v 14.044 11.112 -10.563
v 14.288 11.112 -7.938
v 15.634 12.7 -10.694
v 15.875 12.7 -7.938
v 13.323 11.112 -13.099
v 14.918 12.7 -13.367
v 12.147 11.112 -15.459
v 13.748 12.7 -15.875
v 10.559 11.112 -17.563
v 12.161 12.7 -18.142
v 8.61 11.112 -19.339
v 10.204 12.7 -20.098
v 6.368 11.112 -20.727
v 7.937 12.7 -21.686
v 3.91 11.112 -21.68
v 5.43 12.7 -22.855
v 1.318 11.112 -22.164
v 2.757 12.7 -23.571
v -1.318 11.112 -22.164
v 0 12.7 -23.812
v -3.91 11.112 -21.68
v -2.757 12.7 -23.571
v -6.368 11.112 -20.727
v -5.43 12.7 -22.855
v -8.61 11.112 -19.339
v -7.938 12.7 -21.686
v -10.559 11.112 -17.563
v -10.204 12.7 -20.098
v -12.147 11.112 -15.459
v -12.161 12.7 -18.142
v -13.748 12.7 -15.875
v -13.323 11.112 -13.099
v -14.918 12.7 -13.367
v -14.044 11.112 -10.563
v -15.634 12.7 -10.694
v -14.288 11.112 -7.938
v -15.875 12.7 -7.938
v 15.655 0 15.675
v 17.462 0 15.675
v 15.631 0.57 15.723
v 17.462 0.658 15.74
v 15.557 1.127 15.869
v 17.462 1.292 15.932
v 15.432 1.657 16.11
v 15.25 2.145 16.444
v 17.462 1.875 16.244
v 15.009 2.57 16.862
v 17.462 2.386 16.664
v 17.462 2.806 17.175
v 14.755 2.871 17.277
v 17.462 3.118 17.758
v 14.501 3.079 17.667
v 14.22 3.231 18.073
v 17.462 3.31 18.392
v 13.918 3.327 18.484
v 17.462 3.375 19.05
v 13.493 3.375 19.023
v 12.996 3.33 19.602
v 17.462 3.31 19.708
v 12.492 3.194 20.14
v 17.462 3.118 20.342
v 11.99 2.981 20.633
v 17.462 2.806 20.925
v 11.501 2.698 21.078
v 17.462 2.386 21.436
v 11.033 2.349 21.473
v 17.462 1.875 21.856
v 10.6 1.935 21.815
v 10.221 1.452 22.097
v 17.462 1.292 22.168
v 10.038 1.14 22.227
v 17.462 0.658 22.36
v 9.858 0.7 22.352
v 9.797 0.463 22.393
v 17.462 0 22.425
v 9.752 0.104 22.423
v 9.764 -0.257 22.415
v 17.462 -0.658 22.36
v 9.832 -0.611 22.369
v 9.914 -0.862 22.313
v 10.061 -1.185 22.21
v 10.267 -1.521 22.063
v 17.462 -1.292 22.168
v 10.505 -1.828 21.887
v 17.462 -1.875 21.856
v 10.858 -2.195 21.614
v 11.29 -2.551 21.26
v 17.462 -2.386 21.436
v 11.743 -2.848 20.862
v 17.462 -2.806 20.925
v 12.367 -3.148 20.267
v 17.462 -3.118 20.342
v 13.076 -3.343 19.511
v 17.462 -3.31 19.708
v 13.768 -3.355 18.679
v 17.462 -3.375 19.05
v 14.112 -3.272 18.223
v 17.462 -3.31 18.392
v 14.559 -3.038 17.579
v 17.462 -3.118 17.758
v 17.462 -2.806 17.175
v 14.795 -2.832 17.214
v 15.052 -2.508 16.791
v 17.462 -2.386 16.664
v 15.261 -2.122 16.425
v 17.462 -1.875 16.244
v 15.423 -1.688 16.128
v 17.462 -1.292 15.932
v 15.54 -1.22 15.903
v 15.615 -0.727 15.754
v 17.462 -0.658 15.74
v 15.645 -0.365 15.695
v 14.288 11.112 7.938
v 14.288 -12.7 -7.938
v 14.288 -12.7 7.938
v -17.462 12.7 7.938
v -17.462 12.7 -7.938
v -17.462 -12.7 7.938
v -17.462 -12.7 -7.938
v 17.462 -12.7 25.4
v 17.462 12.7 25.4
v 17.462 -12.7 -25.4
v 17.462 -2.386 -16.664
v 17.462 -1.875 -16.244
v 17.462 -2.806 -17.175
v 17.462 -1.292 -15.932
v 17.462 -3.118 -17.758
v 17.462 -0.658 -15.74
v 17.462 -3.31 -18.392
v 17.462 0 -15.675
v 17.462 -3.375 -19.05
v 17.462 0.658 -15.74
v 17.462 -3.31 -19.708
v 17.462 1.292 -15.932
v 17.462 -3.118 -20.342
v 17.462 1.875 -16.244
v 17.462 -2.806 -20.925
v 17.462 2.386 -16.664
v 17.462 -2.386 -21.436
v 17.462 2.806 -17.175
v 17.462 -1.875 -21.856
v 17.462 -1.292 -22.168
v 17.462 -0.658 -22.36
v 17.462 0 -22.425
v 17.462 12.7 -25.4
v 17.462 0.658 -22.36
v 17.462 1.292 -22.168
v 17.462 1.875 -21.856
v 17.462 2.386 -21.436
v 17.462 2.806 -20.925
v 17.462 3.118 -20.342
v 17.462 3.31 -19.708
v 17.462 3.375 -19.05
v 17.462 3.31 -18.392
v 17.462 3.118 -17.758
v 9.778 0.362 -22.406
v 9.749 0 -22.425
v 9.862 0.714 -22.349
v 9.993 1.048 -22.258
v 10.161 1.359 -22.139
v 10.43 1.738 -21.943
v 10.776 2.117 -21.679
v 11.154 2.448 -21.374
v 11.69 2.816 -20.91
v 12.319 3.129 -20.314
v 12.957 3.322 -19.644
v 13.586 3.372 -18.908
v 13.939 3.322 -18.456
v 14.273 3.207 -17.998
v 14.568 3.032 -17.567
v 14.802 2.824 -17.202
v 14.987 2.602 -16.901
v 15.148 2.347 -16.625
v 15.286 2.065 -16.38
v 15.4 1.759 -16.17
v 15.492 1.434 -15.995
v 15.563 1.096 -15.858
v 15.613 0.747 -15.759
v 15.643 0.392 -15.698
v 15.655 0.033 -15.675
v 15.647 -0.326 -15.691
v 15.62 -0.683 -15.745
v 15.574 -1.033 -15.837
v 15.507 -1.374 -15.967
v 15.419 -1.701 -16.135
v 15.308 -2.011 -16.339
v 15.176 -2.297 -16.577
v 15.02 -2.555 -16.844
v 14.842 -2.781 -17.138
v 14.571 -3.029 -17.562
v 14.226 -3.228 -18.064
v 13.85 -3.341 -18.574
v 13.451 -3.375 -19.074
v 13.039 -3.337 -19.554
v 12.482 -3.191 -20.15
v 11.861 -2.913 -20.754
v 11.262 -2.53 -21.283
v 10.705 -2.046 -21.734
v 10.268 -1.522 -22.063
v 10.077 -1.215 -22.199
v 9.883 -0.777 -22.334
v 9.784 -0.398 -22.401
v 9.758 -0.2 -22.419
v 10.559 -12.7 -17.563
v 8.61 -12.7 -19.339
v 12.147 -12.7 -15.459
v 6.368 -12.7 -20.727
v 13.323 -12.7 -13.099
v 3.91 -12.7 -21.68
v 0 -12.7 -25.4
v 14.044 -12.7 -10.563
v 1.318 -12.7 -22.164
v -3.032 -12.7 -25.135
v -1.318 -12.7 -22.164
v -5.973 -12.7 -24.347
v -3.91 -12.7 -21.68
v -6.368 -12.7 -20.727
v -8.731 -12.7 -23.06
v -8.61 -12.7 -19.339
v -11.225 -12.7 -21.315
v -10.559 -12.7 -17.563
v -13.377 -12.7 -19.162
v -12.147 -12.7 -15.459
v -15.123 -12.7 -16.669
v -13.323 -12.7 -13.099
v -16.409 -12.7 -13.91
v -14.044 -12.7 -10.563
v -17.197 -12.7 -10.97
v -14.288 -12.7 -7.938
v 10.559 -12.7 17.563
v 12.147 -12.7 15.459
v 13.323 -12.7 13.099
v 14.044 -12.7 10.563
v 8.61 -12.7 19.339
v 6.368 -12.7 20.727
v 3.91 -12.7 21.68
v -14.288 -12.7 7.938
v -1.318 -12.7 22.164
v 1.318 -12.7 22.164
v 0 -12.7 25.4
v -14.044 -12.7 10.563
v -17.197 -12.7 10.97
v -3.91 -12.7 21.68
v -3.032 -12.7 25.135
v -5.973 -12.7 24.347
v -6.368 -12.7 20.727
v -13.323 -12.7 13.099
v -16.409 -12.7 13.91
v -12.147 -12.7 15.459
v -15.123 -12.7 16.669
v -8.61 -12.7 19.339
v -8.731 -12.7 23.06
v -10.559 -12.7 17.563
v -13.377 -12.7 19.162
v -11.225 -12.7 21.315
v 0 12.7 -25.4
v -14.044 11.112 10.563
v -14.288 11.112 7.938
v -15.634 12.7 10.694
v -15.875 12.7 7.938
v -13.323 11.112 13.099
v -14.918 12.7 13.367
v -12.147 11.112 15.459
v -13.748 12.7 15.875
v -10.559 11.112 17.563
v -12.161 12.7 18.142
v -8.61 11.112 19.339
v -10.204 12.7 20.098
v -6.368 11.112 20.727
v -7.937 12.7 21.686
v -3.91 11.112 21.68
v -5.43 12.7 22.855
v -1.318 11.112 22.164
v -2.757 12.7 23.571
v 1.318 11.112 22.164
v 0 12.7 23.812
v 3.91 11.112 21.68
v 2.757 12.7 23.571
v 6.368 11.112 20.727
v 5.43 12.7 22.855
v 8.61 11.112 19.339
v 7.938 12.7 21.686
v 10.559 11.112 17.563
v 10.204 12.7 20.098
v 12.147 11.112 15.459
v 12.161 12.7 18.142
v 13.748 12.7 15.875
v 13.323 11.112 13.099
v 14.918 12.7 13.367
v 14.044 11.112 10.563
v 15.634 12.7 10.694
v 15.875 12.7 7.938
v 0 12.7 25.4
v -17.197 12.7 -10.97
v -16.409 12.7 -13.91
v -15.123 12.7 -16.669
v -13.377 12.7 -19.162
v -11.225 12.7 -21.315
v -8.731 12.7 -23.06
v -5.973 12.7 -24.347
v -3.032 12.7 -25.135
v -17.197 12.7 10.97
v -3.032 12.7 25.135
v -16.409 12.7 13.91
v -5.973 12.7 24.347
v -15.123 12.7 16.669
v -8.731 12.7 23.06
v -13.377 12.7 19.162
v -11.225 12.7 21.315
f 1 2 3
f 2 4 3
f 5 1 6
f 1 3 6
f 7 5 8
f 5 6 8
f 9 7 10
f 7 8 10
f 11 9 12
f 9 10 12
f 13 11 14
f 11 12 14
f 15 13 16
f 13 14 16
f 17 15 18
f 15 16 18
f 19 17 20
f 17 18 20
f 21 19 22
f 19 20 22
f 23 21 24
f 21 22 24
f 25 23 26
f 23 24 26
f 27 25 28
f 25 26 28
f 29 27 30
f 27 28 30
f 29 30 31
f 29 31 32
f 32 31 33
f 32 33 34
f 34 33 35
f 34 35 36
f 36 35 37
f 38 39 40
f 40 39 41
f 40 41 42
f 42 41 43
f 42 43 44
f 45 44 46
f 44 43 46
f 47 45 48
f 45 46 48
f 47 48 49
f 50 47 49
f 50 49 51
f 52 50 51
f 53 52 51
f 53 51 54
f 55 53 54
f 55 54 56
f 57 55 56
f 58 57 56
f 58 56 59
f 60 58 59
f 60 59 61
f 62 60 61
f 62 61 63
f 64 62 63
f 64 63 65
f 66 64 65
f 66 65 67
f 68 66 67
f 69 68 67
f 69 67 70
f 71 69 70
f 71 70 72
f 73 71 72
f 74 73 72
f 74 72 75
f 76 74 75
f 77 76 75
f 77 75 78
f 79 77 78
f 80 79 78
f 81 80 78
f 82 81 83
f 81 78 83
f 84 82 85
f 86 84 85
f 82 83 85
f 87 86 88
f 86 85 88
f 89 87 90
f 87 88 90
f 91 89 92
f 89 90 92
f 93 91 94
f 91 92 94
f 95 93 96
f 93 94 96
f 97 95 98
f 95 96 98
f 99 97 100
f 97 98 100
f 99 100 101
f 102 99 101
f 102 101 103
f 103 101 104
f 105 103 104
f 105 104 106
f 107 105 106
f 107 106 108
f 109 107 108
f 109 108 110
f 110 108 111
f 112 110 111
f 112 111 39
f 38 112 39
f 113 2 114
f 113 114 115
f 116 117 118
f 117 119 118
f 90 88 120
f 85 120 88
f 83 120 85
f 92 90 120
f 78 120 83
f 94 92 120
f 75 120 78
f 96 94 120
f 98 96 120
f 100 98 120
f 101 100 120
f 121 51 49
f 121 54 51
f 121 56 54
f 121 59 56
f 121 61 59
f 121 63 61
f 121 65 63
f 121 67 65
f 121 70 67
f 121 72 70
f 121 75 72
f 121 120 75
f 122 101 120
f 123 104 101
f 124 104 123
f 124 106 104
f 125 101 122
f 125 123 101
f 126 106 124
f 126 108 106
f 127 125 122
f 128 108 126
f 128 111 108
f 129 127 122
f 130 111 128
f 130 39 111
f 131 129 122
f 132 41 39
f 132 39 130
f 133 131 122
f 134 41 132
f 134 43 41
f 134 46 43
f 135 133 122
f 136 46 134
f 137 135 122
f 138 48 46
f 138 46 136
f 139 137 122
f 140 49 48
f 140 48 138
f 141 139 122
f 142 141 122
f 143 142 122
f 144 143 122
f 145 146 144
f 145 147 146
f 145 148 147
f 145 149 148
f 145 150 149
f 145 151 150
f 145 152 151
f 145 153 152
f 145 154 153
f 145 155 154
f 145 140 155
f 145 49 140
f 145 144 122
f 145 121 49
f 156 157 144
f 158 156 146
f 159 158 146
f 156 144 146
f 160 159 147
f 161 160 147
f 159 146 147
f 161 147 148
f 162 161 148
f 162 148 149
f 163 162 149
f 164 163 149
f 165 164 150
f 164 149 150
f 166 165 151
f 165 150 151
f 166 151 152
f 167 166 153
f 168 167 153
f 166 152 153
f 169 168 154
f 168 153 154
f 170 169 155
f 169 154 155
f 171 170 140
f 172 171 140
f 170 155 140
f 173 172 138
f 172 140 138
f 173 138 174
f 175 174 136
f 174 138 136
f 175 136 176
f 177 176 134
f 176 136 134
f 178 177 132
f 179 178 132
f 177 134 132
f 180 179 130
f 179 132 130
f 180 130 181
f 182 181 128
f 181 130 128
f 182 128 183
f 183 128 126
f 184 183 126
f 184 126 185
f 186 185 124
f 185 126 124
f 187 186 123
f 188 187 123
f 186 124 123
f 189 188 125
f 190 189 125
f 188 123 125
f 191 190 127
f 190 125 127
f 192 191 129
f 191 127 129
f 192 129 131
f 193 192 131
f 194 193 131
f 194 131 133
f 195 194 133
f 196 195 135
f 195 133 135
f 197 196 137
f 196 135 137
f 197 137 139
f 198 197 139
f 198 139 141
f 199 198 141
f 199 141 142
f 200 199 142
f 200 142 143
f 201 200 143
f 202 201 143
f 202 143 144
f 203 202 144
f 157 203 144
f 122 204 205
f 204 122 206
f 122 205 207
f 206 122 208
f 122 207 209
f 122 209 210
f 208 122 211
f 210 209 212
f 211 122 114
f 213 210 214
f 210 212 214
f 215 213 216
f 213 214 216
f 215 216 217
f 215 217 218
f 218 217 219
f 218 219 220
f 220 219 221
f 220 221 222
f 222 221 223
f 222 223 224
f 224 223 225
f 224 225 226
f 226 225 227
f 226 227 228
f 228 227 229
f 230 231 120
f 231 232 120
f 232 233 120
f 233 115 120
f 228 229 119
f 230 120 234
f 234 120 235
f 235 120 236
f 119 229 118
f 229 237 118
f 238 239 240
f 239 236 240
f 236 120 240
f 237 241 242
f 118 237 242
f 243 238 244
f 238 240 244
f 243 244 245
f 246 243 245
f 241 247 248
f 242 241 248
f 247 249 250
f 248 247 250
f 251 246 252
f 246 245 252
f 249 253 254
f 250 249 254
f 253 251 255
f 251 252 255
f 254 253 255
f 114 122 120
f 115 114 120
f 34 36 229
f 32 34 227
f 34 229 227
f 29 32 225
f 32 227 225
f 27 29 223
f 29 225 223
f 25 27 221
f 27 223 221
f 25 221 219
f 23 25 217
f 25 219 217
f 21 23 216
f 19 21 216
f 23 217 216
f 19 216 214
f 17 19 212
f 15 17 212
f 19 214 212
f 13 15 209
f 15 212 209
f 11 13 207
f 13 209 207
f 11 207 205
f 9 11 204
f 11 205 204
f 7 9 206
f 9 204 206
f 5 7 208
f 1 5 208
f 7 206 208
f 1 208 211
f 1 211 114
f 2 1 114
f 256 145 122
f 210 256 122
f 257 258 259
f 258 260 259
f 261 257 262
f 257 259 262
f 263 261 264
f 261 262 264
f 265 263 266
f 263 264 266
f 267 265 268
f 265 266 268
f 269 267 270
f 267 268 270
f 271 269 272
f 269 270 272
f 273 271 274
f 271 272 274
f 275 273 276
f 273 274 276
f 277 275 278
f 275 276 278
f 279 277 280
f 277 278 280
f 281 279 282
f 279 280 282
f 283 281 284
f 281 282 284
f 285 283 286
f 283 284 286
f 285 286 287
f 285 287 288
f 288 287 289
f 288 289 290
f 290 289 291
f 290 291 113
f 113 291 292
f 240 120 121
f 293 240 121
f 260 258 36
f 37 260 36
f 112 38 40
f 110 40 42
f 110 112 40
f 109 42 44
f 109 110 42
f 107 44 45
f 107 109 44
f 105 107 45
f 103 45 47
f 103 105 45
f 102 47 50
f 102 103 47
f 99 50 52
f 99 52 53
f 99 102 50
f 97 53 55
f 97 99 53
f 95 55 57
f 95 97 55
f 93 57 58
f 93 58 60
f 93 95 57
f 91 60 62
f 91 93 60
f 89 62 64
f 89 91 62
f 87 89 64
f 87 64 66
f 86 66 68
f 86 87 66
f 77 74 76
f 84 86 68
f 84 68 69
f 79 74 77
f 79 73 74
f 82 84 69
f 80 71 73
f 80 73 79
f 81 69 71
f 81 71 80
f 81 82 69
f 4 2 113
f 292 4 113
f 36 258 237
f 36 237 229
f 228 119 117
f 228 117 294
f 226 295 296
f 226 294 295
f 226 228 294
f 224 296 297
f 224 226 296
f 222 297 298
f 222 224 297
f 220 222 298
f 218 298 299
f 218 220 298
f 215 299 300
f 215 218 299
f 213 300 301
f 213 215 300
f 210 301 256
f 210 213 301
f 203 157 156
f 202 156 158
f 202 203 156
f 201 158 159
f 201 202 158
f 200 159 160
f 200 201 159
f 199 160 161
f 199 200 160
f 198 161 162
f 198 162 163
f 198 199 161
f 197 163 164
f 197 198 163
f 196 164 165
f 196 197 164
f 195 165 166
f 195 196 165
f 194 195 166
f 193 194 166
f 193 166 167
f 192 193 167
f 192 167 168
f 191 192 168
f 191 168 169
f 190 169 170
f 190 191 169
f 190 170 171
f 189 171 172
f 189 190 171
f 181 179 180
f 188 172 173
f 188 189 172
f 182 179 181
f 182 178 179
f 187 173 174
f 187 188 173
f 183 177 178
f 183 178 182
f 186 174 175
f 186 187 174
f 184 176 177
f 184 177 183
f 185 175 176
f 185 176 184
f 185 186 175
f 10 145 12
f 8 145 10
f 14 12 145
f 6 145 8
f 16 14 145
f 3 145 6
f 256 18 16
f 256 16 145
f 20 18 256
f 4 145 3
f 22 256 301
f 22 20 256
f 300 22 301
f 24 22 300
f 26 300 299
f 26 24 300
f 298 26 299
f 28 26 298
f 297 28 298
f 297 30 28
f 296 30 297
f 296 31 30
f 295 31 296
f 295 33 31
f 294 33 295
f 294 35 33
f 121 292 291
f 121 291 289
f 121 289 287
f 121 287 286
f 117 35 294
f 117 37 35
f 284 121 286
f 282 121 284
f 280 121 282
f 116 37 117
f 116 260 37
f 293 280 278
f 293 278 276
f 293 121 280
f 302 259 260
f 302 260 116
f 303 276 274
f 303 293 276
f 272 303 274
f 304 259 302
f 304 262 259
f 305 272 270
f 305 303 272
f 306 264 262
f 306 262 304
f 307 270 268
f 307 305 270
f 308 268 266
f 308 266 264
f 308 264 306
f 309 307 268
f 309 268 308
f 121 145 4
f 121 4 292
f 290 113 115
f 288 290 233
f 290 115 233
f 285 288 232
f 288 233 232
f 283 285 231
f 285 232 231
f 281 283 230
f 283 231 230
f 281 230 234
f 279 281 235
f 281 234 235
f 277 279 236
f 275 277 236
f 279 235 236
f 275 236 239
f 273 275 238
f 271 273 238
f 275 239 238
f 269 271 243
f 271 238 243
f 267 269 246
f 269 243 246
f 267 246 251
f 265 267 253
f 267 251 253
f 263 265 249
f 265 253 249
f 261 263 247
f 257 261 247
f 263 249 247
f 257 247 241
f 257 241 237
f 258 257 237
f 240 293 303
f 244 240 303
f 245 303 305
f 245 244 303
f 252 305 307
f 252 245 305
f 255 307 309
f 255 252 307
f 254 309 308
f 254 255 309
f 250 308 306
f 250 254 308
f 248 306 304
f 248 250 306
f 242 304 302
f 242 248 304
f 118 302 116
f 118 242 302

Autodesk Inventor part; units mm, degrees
ref_plane "YZ Plane" through (0, 0, 0) normal (1, 0, 0) x (0, 1, 0)
ref_plane "XZ Plane" through (0, 0, 0) normal (0, 1, 0) x (-1, 0, 0)
ref_plane "XY Plane" through (0, 0, 0) normal (0, 0, 1) x (1, 0, 0)
sketch "Sketch1" plane through (0, 0, 0) normal (0, 1, 0) x (-1, 0, 0)
  line L0 (0, -7.9375) -> (0, 7.9375) construction
  line L1 (17.4625, -7.9375) -> (17.4625, 7.9375)
  line L2 (-17.4625, 7.9375) -> (-17.4625, -7.9375)
  arc A0 (-17.4625, -7.9375) -> (17.4625, -7.9375) centre (0, -7.9375) ccw
  arc A1 (17.4625, 7.9375) -> (-17.4625, 7.9375) centre (0, 7.9375) ccw
  line L3 (14.2875, 7.9375) -> (14.2875, -7.9375)
  arc A2 (-14.2875, -7.9375) -> (14.2875, -7.9375) centre (0, -7.9375) ccw
  line L4 (-14.2875, -7.9375) -> (-14.2875, 7.9375)
  arc A3 (14.2875, 7.9375) -> (-14.2875, 7.9375) centre (0, 7.9375) ccw
  point P0 (0, 0)
  point P1 (0, 25.4)
  point P2 (0, -25.4)
  dimension "d1" = 34.925
  dimension "d2" = 3.175
  dimension "d3" = 50.8
extrude "Extrusion1" add sketch "Sketch1" along normal mid plane 25.4
sketch "Sketch2" plane through (17.4625, -12.7, -7.9375) normal (1, 0, 0) x (0, 0, -1)
  line L0 (0, 0) -> (0, 25.4) construction
  line L1 (-15.875, 25.4) -> (0, 25.4) construction
  line L2 (-15.875, 0) -> (-15.875, 25.4) construction
  line L3 (0, 0) -> (-15.875, 0) construction
  line L4 (-15.875, 0) -> (-15.875, 25.4) construction
  line L5 (-15.875, 25.4) -> (-15.875, 25.4) construction
  line L6 (-15.875, 25.4) -> (-15.875, 0) construction
  line L7 (-15.875, 0) -> (-15.875, 0) construction
  line L8 (0, 0) -> (0, 25.4) construction
  line L9 (0, 25.4) -> (0, 25.4) construction
  line L10 (0, 0) -> (0, 25.4) construction
  line L11 (0, 0) -> (0, 0) construction
  line L12 (-15.875, 25.4) -> (-33.3375, 25.4) construction
  line L13 (17.4625, 0) -> (17.4625, 25.4) construction
  line L14 (-33.3375, 25.4) -> (17.4625, 25.4)
  line L15 (17.4625, 25.4) -> (17.4625, 0)
  line L16 (17.4625, 0) -> (-33.3375, 0)
  line L17 (-33.3375, 0) -> (-33.3375, 25.4)
  line L18 (0, 0) -> (-15.875, 0) construction
  circle A0 centre (-26.9875, 12.7) radius 3.375
  circle A1 centre (11.1125, 12.7) radius 3.375
  line L19 (-26.9875, 12.7) -> (11.1125, 12.7) construction
  point P0 (-7.9375, 12.7)
  point P1 (-7.9375, 12.7)
  dimension "d6" = 6.75
  dimension "d7" = 38.1
extrude "Extrusion2" add sketch "Sketch2" against normal up to next
extrude "Extrusion3" cut sketch "Sketch1" along normal mid plane 25.4 contours L3 A2 L4 A3
chamfer "Chamfer1" distance 1.5875 angle 45 4 edges at (-14.2875, 12.7, 0) (0, 12.7, -22.225) (14.2875, 12.7, 0) (0, 12.7, 22.225)
properties part number "WL-005" material "Aluminum 6061"
